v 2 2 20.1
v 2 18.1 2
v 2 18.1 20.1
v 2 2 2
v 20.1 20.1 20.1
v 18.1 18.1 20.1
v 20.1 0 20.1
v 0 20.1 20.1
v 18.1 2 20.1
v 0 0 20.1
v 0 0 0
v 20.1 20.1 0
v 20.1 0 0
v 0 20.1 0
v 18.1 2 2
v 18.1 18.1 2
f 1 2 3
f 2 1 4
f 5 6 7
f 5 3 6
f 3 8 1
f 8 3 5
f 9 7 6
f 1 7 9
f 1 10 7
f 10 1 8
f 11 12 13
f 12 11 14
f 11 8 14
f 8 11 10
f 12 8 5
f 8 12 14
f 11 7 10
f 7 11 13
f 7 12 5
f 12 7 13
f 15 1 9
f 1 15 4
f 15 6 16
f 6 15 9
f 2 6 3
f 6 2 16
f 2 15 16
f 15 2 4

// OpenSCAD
/*
Exercicio 2:
Use o comando for para reduzir a quantidade de declarações 'cube' no módulo
criado no Exercicio 1.
*/

Espessura = 2;
Altura = 20.1;        //dimensão na direção Z
Largura = 20.1;       //dimensão na direção X
Comprimento = 20.1;   //dimensão na direção Y


module caixa(A=20,L=20,C=20,E=2) {
    //base
    cube([L,C,E]);

    //lateral direita
    for (i = [0, 1]) {
        //Laterais
        translate(i * [L - E,0,0]) cube([E,C,A]);
        //frente e fundo
        translate(i * [0,C - E,0]) cube([L,E,A]);
    }
}

caixa(A=Altura,L=Largura,C=Comprimento,E=Espessura);
